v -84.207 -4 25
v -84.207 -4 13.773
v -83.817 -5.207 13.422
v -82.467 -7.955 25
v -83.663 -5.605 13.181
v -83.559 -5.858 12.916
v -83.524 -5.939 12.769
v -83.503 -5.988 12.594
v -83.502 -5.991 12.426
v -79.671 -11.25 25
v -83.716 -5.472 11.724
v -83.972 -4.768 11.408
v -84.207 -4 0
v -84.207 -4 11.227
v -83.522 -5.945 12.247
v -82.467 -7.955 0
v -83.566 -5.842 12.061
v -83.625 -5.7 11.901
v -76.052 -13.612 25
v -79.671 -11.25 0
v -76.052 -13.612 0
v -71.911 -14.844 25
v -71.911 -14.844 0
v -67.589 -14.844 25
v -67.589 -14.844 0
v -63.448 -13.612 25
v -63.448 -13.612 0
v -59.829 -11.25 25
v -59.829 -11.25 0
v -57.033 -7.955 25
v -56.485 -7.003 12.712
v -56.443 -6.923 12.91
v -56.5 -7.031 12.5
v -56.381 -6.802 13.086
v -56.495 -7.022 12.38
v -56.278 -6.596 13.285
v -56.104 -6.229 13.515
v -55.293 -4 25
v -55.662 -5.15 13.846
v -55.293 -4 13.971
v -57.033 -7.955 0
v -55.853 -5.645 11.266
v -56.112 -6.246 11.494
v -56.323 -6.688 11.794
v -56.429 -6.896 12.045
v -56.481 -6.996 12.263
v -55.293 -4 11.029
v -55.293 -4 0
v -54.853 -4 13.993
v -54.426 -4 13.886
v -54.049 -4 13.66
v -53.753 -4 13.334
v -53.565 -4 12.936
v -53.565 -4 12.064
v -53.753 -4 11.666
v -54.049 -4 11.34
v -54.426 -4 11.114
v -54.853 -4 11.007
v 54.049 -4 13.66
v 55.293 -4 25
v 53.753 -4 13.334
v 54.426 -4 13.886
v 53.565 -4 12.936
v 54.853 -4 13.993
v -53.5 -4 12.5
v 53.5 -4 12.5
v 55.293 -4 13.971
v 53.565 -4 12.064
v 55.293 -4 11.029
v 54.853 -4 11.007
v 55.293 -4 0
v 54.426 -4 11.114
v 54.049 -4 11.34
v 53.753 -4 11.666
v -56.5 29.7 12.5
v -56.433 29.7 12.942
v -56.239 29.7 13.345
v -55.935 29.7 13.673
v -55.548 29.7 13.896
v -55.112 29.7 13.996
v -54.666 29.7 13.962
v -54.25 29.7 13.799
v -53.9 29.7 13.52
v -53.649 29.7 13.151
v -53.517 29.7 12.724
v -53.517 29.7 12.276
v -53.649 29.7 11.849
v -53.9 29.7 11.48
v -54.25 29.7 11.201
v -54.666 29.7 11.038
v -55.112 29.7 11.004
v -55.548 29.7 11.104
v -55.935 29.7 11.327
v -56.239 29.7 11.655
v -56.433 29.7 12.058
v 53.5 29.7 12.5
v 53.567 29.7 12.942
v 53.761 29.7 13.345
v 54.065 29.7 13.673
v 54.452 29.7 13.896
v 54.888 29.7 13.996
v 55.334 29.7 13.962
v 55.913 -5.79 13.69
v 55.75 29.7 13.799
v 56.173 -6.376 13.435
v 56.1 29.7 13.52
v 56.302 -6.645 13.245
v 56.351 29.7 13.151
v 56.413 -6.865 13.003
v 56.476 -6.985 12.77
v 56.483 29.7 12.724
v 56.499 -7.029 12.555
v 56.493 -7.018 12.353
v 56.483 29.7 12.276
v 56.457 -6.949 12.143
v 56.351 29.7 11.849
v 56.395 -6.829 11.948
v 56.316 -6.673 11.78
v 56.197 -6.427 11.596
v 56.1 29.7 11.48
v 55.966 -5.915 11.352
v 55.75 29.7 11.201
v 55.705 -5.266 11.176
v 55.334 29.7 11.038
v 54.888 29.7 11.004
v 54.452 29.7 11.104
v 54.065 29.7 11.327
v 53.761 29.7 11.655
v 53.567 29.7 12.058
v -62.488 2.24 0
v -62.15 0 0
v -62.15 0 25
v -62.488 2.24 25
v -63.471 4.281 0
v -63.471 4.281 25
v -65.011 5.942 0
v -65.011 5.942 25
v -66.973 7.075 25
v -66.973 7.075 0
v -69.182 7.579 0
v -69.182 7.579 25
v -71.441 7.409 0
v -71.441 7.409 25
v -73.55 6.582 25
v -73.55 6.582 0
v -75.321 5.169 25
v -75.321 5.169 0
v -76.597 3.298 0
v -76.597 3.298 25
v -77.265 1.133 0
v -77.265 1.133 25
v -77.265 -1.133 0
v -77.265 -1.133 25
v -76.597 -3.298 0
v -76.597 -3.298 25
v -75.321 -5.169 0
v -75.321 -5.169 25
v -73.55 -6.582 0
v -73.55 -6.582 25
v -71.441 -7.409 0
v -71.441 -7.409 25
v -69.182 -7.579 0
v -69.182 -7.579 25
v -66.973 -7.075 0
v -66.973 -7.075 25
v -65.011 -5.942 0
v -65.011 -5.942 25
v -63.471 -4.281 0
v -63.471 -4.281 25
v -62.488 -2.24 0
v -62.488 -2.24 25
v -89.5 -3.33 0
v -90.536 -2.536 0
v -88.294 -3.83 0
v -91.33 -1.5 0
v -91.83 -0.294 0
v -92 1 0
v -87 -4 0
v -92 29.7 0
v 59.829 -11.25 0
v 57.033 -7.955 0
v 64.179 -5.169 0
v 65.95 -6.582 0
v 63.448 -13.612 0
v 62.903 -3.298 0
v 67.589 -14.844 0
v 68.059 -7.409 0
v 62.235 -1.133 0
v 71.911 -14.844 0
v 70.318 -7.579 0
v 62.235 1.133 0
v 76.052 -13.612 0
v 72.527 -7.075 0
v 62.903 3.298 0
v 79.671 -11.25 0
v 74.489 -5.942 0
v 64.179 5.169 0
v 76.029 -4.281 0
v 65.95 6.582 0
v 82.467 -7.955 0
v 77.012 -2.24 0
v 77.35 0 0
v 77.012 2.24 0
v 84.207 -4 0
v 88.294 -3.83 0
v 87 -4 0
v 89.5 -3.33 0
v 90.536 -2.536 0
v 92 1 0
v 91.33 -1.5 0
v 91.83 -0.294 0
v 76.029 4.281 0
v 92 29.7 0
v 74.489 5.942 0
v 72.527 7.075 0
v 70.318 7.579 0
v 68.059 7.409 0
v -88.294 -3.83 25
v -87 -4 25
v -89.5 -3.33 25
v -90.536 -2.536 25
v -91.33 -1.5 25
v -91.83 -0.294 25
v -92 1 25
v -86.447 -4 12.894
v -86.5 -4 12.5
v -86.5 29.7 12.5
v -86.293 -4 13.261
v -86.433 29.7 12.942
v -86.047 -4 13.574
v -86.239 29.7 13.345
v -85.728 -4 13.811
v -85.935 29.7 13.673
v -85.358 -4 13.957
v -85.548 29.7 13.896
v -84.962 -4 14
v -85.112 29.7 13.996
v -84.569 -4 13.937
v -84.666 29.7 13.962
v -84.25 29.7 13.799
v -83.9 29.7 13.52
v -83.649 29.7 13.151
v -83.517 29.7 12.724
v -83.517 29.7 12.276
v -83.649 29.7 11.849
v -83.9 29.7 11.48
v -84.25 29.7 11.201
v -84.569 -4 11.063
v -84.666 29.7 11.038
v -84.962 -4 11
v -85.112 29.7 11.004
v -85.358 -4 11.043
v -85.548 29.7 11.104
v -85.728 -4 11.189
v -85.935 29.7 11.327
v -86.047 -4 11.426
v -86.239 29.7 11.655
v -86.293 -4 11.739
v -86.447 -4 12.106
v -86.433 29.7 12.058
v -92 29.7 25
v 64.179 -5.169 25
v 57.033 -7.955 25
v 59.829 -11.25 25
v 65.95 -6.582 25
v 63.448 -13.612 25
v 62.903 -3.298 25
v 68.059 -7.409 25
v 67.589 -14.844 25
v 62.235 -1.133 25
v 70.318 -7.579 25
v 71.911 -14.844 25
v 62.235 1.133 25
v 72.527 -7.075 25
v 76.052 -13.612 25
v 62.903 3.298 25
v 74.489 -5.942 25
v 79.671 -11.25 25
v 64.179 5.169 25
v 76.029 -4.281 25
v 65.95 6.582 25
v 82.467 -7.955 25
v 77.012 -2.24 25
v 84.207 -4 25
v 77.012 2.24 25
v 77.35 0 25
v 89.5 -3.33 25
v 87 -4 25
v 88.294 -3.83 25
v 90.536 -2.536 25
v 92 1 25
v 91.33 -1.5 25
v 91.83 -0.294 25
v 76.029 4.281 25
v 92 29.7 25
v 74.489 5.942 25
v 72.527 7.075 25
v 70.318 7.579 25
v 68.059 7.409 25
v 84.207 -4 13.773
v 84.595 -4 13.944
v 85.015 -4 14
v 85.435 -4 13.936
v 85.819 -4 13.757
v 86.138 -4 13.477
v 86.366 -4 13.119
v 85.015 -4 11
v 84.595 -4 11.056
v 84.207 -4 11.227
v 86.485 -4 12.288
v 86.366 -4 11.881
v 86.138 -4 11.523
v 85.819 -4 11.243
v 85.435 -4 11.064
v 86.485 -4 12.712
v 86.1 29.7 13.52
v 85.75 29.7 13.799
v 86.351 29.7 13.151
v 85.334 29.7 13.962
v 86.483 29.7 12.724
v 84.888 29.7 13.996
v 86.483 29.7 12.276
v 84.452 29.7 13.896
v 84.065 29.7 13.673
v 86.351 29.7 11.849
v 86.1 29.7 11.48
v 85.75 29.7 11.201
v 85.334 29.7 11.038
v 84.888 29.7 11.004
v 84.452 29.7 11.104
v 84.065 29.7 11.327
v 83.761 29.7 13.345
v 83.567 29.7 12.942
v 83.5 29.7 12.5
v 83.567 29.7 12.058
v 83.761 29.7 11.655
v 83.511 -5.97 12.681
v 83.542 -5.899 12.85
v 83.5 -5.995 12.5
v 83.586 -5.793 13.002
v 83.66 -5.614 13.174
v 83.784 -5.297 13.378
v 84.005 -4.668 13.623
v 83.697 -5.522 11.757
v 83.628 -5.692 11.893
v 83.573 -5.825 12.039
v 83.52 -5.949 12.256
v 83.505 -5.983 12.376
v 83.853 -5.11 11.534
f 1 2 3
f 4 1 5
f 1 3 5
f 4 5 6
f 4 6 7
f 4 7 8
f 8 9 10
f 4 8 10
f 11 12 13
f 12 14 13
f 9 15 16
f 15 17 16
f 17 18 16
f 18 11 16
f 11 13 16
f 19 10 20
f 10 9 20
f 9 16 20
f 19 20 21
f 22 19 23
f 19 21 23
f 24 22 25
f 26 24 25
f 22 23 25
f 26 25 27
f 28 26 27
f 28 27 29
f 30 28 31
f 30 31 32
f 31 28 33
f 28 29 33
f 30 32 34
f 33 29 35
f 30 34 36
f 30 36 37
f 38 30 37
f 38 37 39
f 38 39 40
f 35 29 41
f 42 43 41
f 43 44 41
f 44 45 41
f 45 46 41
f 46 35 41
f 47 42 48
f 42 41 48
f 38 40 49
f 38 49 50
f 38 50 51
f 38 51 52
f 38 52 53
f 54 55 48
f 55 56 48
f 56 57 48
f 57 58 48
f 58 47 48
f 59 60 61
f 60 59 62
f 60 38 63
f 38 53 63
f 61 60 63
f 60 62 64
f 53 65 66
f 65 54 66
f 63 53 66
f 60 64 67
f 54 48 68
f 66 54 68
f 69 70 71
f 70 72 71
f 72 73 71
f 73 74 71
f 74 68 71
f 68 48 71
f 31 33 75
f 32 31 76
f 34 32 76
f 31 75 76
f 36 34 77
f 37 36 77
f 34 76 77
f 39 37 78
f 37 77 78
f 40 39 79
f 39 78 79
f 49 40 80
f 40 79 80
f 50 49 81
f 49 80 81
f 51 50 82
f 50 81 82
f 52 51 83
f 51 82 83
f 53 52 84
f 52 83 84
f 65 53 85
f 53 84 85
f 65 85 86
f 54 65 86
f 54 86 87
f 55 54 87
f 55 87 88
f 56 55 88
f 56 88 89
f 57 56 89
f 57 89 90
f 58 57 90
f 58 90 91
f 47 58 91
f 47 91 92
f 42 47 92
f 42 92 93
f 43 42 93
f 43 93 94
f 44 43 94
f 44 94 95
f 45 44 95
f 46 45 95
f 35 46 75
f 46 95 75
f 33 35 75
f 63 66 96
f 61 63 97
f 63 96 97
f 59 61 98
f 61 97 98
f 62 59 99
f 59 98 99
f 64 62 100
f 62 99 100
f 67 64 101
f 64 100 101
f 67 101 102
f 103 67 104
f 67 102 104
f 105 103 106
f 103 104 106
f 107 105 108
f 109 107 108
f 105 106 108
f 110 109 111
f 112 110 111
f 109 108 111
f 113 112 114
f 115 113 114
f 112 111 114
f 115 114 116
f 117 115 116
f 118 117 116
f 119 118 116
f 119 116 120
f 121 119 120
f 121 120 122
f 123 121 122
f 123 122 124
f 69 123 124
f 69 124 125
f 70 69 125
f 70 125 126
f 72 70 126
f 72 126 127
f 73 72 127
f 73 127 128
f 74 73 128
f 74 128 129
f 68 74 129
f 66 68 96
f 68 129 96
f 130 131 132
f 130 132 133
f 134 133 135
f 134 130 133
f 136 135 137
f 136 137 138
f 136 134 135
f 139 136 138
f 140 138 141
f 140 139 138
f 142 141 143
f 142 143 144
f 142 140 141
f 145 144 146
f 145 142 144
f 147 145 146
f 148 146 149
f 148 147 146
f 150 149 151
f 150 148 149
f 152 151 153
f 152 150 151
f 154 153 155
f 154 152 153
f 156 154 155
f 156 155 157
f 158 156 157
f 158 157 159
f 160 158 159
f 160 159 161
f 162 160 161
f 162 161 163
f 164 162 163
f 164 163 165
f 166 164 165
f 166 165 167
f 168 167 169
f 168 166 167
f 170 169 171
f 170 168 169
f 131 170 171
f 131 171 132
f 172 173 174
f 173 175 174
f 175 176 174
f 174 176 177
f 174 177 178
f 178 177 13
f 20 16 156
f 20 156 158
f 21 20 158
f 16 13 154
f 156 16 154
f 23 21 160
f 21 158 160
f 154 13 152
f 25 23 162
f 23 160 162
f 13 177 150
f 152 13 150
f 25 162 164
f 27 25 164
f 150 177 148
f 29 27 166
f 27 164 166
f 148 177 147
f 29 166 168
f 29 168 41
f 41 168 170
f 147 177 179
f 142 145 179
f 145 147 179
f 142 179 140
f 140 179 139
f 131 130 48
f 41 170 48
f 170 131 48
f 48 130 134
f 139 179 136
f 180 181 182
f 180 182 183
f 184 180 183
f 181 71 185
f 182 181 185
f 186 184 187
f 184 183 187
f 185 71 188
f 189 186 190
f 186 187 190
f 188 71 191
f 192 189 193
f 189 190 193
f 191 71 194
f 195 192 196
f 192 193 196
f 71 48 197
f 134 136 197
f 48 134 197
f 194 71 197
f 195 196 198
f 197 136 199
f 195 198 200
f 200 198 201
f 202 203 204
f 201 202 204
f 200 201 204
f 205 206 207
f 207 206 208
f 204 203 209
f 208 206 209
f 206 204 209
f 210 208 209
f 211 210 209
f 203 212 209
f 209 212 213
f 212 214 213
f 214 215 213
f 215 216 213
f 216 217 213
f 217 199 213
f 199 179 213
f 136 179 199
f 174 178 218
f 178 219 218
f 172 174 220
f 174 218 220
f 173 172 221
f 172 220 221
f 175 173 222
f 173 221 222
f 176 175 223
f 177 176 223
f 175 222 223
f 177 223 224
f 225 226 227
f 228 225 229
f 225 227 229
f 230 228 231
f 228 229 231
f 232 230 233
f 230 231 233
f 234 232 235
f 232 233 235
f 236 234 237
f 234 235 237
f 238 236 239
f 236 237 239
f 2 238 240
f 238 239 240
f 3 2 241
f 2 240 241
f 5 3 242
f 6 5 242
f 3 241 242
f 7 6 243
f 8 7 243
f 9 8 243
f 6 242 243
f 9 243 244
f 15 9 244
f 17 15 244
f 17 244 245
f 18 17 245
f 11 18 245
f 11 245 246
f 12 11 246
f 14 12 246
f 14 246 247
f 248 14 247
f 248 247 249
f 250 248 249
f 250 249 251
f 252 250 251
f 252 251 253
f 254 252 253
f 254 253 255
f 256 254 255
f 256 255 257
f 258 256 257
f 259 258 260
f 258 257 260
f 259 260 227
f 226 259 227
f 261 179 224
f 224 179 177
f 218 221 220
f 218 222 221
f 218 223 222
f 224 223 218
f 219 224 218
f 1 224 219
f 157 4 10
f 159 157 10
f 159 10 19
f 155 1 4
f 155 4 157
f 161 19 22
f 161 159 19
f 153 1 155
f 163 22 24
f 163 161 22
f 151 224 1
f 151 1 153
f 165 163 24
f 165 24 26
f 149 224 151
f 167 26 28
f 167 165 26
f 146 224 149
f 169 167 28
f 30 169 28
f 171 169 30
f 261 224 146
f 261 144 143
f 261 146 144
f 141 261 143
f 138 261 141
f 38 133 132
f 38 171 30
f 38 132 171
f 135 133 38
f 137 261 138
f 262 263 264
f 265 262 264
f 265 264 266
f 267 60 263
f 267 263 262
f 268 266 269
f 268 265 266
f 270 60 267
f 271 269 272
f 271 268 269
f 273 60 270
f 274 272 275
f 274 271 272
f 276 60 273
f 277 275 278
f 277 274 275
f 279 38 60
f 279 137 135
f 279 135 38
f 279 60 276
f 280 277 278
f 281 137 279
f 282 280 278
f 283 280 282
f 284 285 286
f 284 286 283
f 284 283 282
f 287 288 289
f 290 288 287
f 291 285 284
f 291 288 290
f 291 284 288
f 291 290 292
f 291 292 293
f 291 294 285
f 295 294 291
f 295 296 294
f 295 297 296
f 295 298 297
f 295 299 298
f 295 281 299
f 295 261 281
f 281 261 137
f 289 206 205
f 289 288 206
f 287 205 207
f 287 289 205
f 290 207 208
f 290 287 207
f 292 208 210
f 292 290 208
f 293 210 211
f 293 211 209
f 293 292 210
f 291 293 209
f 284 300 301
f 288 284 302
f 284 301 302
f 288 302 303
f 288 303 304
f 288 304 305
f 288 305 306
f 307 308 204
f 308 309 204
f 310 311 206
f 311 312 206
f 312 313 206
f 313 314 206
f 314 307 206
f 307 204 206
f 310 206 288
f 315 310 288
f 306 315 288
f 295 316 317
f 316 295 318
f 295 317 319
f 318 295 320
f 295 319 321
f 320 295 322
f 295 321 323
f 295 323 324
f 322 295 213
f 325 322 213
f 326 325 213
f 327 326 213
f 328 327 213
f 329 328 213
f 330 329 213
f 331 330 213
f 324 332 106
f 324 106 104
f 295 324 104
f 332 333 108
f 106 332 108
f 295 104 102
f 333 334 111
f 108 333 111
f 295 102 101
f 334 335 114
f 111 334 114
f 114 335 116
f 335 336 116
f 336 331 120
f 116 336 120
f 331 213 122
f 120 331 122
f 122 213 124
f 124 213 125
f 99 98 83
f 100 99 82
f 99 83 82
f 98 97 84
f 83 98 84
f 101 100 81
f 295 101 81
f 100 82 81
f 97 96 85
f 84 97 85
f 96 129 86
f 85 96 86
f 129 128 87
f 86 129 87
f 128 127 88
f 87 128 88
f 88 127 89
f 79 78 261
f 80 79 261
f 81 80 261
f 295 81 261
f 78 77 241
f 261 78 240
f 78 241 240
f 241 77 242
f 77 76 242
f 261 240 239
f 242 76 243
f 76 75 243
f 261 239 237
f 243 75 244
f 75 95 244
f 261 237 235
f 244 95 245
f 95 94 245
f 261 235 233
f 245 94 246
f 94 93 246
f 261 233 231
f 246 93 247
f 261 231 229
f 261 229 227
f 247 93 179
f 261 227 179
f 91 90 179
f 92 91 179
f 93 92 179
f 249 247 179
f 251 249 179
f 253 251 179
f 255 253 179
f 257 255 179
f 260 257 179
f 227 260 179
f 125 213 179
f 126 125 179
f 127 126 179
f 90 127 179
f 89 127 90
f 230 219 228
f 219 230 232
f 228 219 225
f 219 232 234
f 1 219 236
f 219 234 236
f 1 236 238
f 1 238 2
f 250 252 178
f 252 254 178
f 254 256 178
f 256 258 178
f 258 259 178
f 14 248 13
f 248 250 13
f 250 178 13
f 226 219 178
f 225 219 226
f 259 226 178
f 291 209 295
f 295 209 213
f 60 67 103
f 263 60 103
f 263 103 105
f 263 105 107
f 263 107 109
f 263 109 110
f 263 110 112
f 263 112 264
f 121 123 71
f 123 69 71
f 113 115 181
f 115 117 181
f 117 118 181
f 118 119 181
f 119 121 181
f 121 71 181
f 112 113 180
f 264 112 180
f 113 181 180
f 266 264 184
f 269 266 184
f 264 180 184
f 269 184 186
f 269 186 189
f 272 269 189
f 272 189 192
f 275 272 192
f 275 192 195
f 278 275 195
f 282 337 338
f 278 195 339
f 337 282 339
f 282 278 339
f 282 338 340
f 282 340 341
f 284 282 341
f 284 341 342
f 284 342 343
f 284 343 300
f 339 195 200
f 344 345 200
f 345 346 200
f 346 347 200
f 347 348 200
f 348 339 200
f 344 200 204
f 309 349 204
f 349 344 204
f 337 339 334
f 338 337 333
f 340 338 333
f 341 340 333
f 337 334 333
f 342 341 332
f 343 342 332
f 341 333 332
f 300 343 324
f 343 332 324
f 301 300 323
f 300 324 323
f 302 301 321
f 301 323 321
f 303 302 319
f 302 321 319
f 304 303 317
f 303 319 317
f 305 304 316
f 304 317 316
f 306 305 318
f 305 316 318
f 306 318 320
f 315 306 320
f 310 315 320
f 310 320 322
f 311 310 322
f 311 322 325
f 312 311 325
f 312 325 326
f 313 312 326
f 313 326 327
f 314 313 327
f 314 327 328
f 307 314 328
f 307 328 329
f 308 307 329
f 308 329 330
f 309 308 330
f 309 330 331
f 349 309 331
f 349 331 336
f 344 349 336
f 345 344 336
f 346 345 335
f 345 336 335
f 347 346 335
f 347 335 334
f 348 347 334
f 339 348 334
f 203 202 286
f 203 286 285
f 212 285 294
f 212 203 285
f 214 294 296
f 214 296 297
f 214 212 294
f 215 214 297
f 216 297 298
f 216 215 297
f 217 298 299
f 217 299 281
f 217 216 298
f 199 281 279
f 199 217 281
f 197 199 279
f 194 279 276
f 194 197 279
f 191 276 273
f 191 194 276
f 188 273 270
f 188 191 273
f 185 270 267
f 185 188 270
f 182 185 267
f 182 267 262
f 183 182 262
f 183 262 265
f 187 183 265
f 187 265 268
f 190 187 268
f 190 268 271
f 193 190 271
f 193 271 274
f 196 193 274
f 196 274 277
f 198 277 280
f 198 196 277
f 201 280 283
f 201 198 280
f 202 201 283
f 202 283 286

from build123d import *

# Parameters (mm, degrees)
F0_R     = 7.6
F1_DEPTH = 25
F2_R     = 1.5
F3_DEPTH = 44.701
F4_R     = 5


with BuildPart() as f1:
    # F0 (on Top) → F1 (new body)
    with BuildSketch(Plane.XY):
        with BuildLine():
            ThreePointArc((-84.206832, -4), (-69.75, -15), (-55.293168, -4))
            Line((-55.293168, -4), (55.293168, -4))
            ThreePointArc((55.293168, -4), (69.75, -15), (84.206832, -4))
            Line((84.206832, -4), (92, -4))
            Line((92, -4), (92, 29.7))
            Line((92, 29.7), (-92, 29.7))
            Line((-92, 29.7), (-92, -4))
            Line((-92, -4), (-84.206832, -4))
        make_face()
        with Locations((-69.75, 0)):
            Circle(F0_R, mode=Mode.SUBTRACT)
        with Locations((69.75, 0)):
            Circle(F0_R, mode=Mode.SUBTRACT)
    extrude(amount=F1_DEPTH)

    # F2 (on face) → F3 (cut, through all)
    with BuildSketch(Plane(origin=(0, 29.7, 0), x_dir=(-1, 0, 0), z_dir=(0, 1, 0))):
        with Locations((55, 12.5)):
            Circle(F2_R)
        with Locations((-55, 12.5)):
            Circle(F2_R)
        with Locations((85, 12.5)):
            Circle(F2_R)
        with Locations((-85, 12.5)):
            Circle(F2_R)
    extrude(amount=-F3_DEPTH, mode=Mode.SUBTRACT)

    # F4
    f4_edges = [f1.edges().sort_by_distance(p)[0] for p in [
        (-92, -4, 12.5),
        (92, -4, 12.5),
    ]]
    fillet(f4_edges, radius=F4_R)


solid = f1.part
